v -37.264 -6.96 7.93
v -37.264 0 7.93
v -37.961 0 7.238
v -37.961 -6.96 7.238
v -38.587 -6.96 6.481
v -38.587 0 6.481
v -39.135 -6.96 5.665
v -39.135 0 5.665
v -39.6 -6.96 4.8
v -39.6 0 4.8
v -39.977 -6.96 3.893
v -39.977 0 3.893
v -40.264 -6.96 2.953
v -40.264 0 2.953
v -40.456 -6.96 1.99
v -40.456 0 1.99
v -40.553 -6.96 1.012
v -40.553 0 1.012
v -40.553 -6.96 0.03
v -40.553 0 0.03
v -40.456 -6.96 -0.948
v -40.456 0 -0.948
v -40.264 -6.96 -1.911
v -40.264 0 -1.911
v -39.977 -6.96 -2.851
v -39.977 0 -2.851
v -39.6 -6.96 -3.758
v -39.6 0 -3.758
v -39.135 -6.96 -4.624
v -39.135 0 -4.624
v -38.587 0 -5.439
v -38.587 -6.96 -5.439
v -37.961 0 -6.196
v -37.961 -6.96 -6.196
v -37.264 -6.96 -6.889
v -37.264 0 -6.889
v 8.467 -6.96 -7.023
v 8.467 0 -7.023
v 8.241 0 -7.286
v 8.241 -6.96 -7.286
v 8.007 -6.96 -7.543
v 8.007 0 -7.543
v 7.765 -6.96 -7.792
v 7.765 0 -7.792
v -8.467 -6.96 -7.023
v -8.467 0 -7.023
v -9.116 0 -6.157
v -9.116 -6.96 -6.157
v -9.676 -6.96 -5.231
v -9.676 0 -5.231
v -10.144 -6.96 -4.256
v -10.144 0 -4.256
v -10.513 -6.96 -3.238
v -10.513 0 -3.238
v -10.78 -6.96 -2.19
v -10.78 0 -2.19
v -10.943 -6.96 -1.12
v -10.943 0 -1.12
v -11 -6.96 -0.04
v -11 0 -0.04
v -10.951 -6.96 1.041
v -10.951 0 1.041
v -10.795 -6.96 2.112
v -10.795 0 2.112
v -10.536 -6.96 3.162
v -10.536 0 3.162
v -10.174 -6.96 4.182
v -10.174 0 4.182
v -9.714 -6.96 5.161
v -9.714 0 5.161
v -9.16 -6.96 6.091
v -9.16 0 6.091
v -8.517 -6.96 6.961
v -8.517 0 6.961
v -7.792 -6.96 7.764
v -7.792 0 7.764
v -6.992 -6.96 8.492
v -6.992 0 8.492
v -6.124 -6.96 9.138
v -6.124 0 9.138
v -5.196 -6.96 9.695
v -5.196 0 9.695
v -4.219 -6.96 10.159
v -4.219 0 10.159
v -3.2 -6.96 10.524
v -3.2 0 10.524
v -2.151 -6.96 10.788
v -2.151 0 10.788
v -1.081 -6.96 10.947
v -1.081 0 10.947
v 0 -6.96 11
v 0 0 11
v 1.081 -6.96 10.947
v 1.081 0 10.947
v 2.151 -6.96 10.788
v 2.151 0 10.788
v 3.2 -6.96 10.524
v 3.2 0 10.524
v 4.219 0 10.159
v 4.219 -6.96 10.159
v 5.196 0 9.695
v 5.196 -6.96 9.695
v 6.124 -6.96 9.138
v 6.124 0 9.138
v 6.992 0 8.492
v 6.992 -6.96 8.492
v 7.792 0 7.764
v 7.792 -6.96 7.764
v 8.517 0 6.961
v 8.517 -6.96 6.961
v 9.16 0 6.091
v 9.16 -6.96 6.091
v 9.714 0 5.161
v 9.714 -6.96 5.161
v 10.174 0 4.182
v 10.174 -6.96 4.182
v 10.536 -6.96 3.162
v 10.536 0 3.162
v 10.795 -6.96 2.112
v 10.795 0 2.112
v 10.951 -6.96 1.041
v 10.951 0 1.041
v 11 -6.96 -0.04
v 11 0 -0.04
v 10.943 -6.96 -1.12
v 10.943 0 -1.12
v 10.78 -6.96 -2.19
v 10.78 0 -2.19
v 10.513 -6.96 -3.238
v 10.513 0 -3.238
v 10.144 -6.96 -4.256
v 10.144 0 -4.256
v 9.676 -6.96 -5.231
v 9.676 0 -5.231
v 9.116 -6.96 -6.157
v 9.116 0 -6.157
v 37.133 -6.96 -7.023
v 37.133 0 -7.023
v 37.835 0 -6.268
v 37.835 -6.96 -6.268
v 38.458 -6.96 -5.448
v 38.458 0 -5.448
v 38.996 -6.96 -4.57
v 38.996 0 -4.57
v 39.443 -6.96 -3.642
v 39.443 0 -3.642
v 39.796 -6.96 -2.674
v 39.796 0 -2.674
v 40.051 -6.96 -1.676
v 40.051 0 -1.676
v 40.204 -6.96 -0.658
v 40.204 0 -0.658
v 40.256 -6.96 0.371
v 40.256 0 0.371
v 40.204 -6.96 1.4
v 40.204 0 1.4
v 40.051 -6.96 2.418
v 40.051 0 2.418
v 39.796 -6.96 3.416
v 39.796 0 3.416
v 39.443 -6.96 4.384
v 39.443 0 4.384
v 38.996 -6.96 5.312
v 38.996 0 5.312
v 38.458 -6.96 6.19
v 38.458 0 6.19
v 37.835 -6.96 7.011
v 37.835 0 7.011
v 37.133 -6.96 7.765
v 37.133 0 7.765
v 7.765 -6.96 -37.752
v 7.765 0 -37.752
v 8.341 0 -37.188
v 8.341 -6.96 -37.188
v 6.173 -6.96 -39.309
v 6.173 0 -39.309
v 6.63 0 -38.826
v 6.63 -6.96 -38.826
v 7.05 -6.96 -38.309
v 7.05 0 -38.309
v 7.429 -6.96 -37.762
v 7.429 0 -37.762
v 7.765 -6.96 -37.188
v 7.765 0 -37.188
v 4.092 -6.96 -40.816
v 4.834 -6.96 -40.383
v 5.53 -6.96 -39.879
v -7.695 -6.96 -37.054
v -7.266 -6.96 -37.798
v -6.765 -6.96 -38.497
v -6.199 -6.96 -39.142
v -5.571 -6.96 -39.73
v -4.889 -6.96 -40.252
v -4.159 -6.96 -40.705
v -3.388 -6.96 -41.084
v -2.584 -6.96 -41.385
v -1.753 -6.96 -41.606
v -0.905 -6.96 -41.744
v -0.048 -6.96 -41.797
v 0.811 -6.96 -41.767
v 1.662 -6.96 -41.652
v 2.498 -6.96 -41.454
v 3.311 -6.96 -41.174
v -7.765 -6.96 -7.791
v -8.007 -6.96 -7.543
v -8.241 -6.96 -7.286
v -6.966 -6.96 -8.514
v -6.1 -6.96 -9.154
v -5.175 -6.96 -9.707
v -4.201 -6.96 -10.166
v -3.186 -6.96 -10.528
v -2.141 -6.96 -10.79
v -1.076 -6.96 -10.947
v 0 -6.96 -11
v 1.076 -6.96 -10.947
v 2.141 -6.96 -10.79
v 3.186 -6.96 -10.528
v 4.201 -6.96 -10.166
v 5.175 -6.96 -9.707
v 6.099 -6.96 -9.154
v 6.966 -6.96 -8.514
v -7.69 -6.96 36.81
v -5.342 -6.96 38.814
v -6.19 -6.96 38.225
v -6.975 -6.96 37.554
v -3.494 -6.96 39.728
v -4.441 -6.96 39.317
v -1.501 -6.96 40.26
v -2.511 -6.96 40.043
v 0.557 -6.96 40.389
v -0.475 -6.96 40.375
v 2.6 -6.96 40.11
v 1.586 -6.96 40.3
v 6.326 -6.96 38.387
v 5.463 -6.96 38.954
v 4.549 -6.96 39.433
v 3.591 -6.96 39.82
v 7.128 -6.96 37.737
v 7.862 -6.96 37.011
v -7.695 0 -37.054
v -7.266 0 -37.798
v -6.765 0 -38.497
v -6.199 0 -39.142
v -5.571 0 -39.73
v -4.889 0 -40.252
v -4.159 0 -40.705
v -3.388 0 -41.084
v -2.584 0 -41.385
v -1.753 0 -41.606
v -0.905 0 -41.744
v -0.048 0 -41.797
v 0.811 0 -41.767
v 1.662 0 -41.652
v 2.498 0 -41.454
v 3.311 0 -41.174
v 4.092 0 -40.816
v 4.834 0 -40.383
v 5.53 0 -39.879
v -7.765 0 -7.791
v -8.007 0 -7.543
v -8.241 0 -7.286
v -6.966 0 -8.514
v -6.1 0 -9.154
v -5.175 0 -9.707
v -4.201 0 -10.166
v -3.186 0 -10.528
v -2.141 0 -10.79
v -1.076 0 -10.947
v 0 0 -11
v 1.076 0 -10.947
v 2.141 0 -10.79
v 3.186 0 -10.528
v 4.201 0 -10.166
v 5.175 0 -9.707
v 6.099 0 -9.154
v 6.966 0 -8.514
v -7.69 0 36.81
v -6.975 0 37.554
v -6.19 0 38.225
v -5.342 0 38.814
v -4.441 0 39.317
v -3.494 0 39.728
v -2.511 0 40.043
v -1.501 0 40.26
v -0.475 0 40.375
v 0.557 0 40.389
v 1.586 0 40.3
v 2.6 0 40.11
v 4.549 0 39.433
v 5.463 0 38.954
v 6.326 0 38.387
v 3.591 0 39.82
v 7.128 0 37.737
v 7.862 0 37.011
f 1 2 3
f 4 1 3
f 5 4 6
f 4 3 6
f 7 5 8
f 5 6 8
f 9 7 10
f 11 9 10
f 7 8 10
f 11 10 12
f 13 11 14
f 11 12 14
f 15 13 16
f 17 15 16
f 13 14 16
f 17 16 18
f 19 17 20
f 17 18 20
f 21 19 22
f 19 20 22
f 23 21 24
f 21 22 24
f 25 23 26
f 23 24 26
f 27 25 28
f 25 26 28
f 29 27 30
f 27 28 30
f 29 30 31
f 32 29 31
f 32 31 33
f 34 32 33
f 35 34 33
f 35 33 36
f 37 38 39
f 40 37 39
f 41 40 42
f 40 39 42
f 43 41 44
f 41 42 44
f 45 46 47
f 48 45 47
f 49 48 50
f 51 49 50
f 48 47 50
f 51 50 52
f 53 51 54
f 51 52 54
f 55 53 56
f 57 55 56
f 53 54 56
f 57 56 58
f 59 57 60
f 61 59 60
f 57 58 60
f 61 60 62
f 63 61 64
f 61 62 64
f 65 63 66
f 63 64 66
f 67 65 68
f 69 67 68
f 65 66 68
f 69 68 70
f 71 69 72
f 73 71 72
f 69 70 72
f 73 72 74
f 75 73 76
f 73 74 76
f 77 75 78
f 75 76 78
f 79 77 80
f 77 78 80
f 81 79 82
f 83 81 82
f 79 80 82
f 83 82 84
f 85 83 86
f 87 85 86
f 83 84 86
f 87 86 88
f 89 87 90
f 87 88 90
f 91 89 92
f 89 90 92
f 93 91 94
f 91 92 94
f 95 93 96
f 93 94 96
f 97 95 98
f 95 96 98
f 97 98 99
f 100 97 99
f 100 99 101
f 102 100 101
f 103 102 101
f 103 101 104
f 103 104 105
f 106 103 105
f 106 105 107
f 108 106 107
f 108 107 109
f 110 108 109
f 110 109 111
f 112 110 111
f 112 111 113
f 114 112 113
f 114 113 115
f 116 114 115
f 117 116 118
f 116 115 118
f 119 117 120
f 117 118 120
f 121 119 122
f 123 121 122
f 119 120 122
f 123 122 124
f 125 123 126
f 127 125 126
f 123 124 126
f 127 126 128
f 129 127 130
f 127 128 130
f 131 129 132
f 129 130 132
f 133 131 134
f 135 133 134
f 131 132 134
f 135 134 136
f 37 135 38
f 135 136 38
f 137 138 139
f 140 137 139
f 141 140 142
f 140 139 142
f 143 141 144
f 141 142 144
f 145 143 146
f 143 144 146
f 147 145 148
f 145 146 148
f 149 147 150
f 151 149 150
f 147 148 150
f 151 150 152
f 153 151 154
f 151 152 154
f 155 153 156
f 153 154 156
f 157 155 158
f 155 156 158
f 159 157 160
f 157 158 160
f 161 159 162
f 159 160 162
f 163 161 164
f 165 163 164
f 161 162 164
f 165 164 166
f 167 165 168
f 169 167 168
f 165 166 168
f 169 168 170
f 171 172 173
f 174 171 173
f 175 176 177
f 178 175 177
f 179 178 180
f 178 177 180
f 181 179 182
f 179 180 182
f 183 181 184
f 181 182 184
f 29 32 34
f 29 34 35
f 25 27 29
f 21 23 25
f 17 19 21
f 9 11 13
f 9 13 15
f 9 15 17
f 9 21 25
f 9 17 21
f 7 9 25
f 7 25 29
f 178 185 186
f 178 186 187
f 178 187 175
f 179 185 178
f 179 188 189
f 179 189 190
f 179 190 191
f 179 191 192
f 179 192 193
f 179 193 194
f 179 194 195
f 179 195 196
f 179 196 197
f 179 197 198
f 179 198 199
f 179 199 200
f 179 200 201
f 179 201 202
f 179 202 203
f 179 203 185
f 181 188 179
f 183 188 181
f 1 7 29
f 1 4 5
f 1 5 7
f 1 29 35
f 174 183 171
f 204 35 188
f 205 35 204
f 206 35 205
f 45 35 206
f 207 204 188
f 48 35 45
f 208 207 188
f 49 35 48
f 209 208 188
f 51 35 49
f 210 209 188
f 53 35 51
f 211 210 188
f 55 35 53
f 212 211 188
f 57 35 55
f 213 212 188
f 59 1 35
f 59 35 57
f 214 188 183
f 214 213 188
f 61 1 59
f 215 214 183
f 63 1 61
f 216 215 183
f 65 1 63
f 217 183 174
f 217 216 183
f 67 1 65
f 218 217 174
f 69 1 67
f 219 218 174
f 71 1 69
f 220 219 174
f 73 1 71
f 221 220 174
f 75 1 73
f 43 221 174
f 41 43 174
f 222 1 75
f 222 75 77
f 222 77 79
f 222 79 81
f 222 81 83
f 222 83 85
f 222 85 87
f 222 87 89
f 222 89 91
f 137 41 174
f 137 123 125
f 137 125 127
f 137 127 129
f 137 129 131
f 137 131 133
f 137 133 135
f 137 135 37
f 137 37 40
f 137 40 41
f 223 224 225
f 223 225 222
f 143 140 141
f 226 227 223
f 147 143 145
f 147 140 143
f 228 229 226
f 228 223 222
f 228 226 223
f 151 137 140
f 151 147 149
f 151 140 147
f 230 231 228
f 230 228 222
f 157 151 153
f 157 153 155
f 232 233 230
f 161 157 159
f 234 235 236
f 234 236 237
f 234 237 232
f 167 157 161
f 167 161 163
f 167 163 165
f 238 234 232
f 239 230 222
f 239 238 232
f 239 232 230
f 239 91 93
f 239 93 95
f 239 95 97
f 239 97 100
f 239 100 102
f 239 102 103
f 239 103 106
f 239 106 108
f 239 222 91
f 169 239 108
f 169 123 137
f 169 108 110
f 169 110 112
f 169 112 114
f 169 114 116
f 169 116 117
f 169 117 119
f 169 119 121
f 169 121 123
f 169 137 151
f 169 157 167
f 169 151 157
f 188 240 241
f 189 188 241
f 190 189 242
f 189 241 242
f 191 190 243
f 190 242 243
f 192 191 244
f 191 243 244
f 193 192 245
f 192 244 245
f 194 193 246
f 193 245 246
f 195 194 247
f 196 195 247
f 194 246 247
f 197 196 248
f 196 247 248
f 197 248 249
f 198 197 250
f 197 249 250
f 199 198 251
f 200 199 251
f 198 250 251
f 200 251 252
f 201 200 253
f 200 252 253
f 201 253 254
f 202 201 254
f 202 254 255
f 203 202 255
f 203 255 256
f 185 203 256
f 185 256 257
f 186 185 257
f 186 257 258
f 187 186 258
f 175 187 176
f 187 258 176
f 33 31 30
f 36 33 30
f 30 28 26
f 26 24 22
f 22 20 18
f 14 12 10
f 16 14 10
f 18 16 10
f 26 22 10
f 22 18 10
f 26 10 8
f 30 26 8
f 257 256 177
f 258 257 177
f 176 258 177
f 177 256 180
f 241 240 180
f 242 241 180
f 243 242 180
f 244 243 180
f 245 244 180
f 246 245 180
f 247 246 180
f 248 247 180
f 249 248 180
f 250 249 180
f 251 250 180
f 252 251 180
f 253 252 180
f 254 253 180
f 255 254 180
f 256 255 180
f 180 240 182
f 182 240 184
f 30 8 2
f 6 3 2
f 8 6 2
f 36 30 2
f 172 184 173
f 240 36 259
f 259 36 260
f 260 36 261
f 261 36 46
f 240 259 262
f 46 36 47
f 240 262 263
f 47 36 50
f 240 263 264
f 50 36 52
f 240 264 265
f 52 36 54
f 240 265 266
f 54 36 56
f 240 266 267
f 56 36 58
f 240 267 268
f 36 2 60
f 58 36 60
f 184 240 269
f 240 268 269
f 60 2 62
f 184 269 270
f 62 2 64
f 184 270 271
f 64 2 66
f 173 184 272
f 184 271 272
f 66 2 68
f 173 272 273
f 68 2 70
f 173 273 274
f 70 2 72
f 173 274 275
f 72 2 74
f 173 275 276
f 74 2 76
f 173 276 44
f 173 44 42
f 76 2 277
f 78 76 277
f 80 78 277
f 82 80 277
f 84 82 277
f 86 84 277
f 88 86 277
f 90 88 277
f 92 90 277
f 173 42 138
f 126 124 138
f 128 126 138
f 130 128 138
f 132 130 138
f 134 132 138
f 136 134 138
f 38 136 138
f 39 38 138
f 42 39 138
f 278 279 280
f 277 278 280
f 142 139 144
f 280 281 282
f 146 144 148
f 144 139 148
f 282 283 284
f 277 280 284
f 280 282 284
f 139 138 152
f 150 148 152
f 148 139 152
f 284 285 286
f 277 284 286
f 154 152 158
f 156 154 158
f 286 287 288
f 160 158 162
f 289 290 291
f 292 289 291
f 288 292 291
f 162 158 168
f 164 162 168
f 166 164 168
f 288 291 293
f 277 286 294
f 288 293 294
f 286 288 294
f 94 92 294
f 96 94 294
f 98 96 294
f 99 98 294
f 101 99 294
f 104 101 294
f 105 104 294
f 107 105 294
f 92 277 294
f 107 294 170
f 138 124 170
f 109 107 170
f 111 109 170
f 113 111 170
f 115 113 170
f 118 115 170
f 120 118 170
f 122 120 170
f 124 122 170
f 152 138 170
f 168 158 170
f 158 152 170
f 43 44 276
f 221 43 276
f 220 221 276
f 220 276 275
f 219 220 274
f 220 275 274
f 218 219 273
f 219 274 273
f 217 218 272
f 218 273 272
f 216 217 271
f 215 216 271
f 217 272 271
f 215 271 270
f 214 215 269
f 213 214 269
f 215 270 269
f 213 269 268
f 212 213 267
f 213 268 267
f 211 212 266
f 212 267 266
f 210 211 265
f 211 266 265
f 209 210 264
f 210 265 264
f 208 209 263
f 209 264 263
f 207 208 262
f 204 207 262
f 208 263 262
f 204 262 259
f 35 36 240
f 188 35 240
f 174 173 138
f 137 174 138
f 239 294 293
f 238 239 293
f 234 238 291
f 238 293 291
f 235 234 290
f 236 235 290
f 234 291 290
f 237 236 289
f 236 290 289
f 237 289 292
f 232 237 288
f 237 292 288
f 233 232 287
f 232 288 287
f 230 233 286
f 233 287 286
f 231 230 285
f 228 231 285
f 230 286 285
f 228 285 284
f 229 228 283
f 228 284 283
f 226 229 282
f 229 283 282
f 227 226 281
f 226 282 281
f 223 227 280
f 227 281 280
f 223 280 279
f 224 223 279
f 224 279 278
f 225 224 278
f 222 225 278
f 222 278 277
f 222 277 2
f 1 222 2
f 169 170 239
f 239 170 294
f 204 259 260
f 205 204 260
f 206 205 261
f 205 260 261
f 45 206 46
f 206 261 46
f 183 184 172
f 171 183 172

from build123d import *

# Parameters (mm, degrees)
F1_DEPTH = 6.96


with BuildPart() as f1:
    # F0 (on Front) → F1 (new body)
    with BuildSketch(Plane.XZ):
        with BuildLine():
            Line((7.764825, -37.187766), (7.764825, -37.751798))
            Line((7.764825, -37.751798), (8.341329, -37.187766))
            Line((8.341329, -37.187766), (37.133072, -7.022527))
            ThreePointArc((37.133072, -7.022527), (40.255881, 0.371149), (37.133072, 7.764825))
            Line((37.133072, 7.764825), (7.861621, 37.010901))
            ThreePointArc((7.861621, 37.010901), (0.040821, 40.394728), (-7.689789, 36.809638))
            Line((-7.689789, 36.809638), (-37.264177, 7.930262))
            ThreePointArc((-37.264177, 7.930262), (-40.565071, 0.5208), (-37.264177, -6.888662))
            Line((-37.264177, -6.888662), (-7.694786, -37.053901))
            ThreePointArc((-7.694786, -37.053901), (-1.330862, -41.685065), (6.172718, -39.309461))
            ThreePointArc((6.172718, -39.309461), (7.049861, -38.309462), (7.764825, -37.187766))
        make_face()
        with BuildLine():
            ThreePointArc((-7.764906, -7.79142), (-8.124877, -7.415279), (-8.466647, -7.022527))
            ThreePointArc((-8.466647, -7.022527), (0, 11), (8.466647, -7.022527))
            ThreePointArc((8.466647, -7.022527), (8.124839, -7.415322), (7.764825, -7.791501))
            ThreePointArc((7.764825, -7.791501), (-5.7e-05, -11), (-7.764906, -7.79142))
        make_face(mode=Mode.SUBTRACT)
    extrude(amount=F1_DEPTH)


solid = f1.part
